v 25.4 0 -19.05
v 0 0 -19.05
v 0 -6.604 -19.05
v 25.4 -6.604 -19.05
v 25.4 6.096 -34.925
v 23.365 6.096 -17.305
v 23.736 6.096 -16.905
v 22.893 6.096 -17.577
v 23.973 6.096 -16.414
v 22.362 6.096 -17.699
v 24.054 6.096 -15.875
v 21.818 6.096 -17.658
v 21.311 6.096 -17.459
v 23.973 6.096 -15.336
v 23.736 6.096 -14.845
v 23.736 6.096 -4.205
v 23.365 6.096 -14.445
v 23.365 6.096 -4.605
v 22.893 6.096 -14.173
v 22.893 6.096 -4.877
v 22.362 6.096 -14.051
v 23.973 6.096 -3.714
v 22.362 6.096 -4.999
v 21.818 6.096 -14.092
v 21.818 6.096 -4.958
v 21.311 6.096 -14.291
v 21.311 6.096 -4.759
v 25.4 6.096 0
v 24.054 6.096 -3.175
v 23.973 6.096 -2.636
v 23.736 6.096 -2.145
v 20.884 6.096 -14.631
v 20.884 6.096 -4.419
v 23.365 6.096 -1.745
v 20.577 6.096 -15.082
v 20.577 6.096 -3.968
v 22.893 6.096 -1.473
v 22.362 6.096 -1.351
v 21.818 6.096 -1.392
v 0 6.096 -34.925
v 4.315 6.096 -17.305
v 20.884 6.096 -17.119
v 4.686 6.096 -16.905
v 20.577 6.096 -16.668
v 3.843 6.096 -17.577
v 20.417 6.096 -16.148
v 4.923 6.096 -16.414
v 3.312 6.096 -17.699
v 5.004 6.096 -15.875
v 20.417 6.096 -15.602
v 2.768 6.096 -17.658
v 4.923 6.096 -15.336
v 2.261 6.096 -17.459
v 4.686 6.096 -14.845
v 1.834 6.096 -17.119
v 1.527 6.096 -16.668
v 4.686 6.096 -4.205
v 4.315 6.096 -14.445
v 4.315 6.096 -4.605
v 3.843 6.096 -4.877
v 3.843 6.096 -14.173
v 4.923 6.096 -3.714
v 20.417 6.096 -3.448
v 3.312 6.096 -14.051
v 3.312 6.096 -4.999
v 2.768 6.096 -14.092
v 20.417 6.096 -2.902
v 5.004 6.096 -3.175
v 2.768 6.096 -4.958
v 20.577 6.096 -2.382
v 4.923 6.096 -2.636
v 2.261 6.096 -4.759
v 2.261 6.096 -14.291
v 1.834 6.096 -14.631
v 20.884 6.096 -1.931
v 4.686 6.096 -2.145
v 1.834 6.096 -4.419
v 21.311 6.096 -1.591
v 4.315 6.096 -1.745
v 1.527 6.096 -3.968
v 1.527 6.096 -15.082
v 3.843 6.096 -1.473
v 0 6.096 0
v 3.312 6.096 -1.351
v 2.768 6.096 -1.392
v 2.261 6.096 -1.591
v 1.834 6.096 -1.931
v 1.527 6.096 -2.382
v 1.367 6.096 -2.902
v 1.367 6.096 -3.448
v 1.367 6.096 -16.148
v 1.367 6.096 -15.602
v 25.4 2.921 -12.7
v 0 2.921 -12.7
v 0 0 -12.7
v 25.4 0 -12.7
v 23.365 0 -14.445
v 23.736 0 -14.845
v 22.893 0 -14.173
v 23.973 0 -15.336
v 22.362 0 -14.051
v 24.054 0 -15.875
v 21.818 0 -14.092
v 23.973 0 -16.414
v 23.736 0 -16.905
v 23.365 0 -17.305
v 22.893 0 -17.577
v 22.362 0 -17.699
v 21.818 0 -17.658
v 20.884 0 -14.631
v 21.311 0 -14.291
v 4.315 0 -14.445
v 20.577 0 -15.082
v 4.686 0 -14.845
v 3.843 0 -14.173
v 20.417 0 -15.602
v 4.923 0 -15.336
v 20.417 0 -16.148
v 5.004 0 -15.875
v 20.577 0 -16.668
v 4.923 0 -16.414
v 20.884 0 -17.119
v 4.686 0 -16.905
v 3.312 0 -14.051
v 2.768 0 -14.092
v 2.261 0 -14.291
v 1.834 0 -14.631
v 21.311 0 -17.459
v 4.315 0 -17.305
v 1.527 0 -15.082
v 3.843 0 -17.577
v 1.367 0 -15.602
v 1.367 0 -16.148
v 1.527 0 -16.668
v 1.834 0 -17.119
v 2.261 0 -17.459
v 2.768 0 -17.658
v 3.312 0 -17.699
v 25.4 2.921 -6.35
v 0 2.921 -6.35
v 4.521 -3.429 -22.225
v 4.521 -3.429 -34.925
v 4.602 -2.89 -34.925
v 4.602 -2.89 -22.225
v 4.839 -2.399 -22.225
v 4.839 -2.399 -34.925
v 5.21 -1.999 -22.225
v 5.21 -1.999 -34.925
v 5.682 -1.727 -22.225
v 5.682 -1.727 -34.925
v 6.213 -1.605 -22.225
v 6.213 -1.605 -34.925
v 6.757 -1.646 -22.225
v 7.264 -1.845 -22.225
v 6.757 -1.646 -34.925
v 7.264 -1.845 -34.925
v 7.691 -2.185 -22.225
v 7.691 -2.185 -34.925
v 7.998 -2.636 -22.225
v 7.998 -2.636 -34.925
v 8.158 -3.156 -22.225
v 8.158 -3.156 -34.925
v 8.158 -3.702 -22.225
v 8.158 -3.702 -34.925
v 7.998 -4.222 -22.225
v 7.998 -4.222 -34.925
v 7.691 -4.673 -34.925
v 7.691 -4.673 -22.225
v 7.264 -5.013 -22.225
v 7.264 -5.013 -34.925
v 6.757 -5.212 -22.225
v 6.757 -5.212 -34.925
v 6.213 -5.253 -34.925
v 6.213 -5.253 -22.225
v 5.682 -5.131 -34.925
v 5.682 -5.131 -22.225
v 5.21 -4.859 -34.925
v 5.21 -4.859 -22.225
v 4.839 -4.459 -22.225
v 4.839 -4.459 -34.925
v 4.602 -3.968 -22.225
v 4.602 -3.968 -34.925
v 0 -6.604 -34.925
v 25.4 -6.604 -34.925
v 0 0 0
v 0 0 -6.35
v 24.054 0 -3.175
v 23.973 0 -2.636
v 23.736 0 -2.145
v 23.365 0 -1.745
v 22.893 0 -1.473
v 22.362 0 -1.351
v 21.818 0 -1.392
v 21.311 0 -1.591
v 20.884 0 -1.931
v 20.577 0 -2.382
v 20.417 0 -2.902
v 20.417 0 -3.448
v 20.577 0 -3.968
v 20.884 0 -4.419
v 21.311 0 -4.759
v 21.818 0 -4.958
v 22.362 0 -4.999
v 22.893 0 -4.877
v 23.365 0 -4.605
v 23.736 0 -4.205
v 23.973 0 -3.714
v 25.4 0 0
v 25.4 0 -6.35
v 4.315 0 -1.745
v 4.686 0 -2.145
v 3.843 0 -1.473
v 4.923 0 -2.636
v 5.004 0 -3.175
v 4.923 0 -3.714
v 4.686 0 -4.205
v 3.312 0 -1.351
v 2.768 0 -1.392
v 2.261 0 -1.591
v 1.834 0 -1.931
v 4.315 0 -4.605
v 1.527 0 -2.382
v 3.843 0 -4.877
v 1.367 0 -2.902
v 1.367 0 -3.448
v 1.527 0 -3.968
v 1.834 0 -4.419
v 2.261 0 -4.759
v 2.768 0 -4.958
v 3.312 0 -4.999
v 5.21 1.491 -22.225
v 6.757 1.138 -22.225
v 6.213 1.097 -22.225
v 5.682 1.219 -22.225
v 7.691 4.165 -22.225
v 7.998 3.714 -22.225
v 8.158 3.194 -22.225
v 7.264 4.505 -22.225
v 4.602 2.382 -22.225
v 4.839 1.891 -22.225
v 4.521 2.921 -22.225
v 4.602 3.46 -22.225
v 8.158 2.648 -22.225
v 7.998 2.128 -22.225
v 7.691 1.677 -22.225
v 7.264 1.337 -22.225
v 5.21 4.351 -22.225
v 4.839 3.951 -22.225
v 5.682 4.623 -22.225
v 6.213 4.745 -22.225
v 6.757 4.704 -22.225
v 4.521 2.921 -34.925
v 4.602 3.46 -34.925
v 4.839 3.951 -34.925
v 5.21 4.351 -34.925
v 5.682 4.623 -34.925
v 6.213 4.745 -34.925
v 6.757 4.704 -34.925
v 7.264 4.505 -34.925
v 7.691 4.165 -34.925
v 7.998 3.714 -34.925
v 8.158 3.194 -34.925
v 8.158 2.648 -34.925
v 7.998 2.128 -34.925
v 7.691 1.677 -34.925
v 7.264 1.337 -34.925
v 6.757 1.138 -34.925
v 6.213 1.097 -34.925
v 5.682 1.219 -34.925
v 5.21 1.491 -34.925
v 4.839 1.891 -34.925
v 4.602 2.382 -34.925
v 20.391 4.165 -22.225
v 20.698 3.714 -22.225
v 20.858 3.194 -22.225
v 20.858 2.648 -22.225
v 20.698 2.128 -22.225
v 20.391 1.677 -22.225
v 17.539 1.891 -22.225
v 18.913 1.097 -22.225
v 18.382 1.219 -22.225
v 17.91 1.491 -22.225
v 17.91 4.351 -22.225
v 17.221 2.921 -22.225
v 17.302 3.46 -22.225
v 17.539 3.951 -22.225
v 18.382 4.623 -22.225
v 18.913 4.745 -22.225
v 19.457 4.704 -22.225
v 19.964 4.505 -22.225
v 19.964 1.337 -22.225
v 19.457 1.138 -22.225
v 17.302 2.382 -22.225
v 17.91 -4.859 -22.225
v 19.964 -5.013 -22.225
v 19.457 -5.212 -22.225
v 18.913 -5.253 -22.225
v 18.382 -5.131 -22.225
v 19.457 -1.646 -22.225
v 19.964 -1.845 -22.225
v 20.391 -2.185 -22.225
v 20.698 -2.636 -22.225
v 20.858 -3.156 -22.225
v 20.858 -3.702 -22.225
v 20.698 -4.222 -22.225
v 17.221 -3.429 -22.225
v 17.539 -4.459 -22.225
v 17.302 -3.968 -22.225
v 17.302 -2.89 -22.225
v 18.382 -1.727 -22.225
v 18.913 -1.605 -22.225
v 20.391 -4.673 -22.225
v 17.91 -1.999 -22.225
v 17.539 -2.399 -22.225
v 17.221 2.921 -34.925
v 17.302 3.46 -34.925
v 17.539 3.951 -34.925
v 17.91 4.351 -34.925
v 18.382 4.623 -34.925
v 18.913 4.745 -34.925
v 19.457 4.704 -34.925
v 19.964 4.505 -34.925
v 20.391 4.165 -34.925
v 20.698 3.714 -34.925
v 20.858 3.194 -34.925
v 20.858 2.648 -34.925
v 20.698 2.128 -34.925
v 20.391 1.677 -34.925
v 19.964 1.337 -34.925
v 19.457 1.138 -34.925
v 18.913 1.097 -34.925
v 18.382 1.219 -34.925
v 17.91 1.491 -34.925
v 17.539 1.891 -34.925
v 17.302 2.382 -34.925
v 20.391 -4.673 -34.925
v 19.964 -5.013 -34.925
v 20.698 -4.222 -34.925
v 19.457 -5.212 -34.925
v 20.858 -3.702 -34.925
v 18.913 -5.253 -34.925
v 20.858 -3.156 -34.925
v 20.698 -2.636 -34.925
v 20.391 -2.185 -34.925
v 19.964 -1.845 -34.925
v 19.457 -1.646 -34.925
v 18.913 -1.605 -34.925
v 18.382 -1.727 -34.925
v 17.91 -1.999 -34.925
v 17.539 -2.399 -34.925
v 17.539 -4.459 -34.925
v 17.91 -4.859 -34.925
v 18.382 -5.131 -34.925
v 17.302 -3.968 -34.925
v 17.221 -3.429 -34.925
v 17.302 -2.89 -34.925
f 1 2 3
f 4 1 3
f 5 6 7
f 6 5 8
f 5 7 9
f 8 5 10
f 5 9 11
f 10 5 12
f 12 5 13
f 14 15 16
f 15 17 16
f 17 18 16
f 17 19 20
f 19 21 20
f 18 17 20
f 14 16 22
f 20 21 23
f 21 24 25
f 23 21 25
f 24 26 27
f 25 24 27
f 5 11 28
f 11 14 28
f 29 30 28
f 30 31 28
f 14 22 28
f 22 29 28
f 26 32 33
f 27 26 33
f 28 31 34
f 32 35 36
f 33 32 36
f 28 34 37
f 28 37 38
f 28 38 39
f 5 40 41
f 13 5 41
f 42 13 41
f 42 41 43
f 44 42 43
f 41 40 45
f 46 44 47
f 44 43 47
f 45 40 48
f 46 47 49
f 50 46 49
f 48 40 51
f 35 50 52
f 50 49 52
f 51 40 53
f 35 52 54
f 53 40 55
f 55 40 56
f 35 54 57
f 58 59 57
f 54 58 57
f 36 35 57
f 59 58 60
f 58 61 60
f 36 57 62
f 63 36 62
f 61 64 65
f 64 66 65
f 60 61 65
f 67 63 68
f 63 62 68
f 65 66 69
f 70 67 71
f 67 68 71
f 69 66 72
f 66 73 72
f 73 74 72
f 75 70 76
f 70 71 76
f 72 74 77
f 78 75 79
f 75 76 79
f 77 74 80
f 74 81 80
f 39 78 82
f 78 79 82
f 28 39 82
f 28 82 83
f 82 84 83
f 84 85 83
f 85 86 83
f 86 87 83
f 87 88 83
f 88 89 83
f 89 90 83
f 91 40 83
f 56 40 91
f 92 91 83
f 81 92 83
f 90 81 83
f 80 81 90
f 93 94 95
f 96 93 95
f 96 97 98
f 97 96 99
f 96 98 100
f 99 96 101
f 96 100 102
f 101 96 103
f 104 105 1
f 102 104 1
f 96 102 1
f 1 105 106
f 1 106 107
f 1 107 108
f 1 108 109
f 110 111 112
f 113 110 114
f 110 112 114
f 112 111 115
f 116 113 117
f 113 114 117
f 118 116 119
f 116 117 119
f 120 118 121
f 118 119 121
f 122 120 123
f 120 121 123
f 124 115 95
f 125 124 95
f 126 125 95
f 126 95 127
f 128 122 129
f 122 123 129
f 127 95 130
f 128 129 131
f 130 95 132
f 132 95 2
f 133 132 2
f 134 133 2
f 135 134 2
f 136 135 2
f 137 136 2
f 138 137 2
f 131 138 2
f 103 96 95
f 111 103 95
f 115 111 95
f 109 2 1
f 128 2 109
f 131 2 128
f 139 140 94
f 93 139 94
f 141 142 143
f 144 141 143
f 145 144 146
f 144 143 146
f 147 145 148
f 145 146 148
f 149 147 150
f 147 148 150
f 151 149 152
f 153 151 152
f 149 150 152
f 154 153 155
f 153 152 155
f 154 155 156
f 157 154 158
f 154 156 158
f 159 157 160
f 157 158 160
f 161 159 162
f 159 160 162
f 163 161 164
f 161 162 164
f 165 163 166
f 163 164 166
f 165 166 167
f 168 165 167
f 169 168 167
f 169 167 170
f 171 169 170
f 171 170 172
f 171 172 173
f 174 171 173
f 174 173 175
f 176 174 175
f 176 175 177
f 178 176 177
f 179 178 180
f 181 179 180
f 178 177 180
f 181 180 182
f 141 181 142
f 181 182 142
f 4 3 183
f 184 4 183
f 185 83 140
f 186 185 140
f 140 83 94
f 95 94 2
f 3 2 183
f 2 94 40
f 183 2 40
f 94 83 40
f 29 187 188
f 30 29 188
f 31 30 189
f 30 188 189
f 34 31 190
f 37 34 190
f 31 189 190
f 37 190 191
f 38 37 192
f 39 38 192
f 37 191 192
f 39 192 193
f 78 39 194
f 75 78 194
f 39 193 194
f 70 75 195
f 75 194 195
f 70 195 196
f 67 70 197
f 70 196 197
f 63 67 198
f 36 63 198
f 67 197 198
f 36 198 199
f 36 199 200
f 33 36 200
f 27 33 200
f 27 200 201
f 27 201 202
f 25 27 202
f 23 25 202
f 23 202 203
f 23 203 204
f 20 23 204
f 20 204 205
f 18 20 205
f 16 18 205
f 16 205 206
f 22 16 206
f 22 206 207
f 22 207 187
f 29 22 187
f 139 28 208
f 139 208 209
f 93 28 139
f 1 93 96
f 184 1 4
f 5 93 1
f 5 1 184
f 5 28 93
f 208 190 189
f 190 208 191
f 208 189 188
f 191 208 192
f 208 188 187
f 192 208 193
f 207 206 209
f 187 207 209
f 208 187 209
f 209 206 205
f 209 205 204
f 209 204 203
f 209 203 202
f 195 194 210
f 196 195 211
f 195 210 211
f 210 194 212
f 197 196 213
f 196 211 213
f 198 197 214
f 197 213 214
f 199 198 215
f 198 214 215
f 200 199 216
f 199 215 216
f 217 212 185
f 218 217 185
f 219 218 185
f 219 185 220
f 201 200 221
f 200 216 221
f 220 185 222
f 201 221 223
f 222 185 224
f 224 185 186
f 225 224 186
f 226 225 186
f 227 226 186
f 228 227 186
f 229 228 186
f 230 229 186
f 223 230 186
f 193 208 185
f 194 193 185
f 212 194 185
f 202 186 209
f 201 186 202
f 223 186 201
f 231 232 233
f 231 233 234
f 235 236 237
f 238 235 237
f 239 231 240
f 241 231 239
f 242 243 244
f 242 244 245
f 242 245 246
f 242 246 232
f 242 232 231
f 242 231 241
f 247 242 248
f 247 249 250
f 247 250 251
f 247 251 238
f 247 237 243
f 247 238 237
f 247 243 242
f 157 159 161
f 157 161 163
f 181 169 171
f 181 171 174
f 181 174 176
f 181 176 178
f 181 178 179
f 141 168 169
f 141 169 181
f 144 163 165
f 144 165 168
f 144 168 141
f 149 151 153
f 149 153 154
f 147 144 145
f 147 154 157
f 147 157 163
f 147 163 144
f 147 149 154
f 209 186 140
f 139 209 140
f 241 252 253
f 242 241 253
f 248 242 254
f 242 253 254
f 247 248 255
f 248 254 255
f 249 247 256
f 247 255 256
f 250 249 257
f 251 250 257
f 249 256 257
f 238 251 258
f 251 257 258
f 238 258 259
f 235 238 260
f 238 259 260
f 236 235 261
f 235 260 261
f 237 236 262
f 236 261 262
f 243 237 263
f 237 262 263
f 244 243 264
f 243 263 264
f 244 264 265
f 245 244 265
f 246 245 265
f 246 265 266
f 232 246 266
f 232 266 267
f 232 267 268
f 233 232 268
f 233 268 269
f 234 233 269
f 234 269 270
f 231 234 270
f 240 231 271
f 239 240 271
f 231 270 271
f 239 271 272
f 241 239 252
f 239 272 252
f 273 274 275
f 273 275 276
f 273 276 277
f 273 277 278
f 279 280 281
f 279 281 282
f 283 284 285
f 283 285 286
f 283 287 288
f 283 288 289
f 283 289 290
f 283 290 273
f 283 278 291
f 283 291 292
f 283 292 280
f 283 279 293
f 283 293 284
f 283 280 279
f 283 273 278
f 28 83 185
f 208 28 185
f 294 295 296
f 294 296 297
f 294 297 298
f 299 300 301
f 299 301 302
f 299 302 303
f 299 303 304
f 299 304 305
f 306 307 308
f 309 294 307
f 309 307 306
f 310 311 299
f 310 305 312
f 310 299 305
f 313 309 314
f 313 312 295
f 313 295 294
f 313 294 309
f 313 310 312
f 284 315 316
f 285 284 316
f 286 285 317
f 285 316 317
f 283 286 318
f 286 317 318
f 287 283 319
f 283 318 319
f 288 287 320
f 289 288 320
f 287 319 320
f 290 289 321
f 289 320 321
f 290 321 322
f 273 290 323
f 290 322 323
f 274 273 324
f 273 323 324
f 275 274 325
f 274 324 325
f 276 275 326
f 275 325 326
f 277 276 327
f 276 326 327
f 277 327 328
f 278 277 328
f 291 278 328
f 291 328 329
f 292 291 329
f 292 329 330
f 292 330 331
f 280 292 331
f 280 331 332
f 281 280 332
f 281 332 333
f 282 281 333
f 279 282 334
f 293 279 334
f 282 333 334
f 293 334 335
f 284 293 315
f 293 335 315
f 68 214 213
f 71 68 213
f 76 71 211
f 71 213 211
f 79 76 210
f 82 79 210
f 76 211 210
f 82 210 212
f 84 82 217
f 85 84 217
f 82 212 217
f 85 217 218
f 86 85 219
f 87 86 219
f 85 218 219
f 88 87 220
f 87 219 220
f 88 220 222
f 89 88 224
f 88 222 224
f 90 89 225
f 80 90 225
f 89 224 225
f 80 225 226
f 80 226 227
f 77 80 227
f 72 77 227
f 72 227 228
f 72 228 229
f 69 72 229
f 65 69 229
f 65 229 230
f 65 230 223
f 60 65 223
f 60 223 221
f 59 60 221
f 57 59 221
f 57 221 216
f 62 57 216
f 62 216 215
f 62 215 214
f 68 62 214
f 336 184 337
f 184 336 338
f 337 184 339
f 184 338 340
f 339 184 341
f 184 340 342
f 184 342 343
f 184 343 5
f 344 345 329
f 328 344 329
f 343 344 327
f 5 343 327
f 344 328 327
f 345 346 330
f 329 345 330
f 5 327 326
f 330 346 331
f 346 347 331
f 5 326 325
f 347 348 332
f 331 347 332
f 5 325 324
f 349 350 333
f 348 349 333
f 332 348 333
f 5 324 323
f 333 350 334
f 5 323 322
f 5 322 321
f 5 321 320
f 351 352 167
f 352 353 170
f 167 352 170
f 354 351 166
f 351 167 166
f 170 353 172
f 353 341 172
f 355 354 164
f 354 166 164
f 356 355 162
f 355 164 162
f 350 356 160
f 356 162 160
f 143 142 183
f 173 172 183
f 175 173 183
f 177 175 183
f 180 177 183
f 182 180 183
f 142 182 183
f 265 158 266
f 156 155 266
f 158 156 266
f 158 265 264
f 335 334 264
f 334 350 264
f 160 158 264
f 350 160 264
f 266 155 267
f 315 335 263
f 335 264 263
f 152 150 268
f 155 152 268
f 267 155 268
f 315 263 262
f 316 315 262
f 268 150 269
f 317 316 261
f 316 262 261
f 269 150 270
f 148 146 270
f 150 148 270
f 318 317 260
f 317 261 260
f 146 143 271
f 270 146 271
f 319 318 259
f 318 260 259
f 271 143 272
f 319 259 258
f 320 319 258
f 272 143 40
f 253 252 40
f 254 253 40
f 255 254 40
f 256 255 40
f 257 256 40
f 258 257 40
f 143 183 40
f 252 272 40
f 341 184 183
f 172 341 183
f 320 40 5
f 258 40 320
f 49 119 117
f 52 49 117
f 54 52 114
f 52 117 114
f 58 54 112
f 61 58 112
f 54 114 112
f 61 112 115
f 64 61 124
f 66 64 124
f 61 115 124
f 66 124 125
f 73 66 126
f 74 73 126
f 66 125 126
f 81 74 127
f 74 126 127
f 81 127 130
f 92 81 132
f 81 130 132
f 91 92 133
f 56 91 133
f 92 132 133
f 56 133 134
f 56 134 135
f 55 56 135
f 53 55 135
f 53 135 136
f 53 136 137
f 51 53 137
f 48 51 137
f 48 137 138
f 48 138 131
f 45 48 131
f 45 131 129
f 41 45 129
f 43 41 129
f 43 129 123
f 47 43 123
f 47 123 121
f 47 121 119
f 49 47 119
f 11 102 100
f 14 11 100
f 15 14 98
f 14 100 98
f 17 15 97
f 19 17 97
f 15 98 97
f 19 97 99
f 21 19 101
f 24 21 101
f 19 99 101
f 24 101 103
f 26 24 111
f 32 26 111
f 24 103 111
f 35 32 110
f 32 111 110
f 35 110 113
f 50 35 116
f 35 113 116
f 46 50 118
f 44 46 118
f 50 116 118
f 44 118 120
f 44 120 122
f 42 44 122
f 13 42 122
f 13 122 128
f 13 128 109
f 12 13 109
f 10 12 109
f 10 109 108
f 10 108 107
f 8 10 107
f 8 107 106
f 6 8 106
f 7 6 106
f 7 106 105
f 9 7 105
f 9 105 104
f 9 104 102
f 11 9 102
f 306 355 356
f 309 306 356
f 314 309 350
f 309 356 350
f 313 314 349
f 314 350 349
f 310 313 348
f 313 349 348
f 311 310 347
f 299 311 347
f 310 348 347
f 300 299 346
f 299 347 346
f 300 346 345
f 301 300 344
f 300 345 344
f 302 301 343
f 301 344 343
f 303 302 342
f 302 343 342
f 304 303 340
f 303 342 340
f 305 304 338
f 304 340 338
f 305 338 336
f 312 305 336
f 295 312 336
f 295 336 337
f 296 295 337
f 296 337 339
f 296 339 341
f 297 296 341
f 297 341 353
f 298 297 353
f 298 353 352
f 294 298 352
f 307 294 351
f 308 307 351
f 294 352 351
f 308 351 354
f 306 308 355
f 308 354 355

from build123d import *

# Parameters (mm, degrees)
BOSS_EXTRUDE1_DEPTH = 25.4
SKETCH2_R           = 1.8288
CUT_EXTRUDE1_DEPTH  = 12.7
SKETCH3_R           = 1.8288
CUT_EXTRUDE2_DEPTH  = 12.7


with BuildPart() as part:
    # Sketch1 → Boss-Extrude1 (new body)
    with BuildSketch(Plane(origin=(0, 0, 0), x_dir=(0, 0, -1), z_dir=(1, 0, 0))):
        Polygon((0, 6.096), (0, 0), (6.35, 0), (6.35, 2.921), (12.7, 2.921), (12.7, 0), (19.05, 0), (19.05, -6.604), (34.925, -6.604), (34.925, 6.096), align=None)
    extrude(amount=BOSS_EXTRUDE1_DEPTH)

    # Sketch2 → Cut-Extrude1 (cut)
    with BuildSketch(Plane(origin=(0, 0, -34.925), x_dir=(-1, 0, 0), z_dir=(0, 0, -1))):
        with Locations((-19.05, 2.921)):
            Circle(SKETCH2_R)
        with Locations((-6.35, 2.921)):
            Circle(SKETCH2_R)
        with Locations((-19.05, -3.429)):
            Circle(SKETCH2_R)
        with Locations((-6.35, -3.429)):
            Circle(SKETCH2_R)
    extrude(amount=-CUT_EXTRUDE1_DEPTH, mode=Mode.SUBTRACT)

    # Sketch3 → Cut-Extrude2 (cut)
    with BuildSketch(Plane.XZ):
        with Locations((3.175, -3.175)):
            Circle(SKETCH3_R)
        with Locations((3.175, -15.875)):
            Circle(SKETCH3_R)
        with Locations((22.225, -3.175)):
            Circle(SKETCH3_R)
        with Locations((22.225, -15.875)):
            Circle(SKETCH3_R)
    extrude(amount=-CUT_EXTRUDE2_DEPTH, mode=Mode.SUBTRACT)


solid = part.part
